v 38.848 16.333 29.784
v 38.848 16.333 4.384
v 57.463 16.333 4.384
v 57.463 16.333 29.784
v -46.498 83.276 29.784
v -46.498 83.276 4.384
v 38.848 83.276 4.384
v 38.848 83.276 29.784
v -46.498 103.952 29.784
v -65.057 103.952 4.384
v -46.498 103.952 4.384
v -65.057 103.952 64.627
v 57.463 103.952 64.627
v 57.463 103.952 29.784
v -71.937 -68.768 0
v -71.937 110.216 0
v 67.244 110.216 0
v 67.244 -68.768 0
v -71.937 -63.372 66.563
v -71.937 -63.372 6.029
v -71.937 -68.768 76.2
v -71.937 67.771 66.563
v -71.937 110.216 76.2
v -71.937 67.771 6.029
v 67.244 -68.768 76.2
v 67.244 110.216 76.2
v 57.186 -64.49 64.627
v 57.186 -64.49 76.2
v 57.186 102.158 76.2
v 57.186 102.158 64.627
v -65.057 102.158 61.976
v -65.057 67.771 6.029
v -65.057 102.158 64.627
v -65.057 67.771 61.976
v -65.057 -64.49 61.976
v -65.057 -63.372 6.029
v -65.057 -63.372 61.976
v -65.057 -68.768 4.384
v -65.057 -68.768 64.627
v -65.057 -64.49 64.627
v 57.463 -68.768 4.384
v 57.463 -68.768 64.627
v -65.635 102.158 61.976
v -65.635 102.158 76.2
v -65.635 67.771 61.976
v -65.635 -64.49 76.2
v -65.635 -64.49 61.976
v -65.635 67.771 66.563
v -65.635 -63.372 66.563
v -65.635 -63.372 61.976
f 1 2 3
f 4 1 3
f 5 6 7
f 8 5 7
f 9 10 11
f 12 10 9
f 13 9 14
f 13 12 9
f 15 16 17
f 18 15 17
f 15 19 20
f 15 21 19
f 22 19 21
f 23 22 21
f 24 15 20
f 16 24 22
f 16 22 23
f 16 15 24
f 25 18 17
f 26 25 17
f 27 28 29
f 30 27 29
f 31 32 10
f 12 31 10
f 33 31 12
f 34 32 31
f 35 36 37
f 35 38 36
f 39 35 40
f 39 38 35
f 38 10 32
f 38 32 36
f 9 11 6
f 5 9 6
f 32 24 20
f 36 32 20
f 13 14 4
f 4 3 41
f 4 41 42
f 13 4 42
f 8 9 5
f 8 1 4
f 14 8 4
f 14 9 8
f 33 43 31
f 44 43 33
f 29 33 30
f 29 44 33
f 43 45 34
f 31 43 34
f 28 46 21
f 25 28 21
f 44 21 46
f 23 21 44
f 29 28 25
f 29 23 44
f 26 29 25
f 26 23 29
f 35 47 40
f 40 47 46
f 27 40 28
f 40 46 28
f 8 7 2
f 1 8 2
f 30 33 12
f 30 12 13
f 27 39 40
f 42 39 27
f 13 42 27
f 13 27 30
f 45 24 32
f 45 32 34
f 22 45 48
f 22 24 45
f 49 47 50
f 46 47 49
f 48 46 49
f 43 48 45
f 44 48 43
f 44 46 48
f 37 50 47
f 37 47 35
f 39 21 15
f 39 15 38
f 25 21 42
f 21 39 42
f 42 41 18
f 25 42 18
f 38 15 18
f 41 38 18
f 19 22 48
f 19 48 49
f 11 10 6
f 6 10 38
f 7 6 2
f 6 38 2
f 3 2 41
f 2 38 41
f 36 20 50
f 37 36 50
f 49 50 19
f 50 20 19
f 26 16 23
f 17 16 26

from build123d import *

# Parameters (mm, degrees)
F0_W     = 139.181651175
F0_H     = 178.9838671684
F1_DEPTH = 76.2
F2_W     = 122.5202530622
F2_H     = 60.2431138977
F3_DEPTH = 172.72
F4_W     = 131.1423294246
F4_H     = 60.5337903835
F5_DEPTH = 25.4
F7_DEPTH = 25.4
F8_W     = 122.8211522102
F8_H     = 166.64852947
F9_DEPTH = 14.224


with BuildPart() as f1:
    # F0 (on Top) → F1 (new body)
    with BuildSketch(Plane.XY):
        with Locations((-2.3464225233, 20.7241773605)):
            Rectangle(F0_W, F0_H)
    extrude(amount=F1_DEPTH)

    # F2 (on face) → F3 (cut)
    with BuildSketch(Plane.XZ.offset(68.7677562237)):
        with Locations((-3.7967562675, 34.5050995238)):
            Rectangle(F2_W, F2_H)
    extrude(amount=-F3_DEPTH, mode=Mode.SUBTRACT)

    # F4 (on face) → F5 (cut)
    with BuildSketch(Plane(origin=(-71.9372481108, 0, 0), x_dir=(0, -1, 0), z_dir=(-1, 0, 0))):
        with Locations((-2.1996553987, 36.2956381869)):
            Rectangle(F4_W, F4_H)
    extrude(amount=-F5_DEPTH, mode=Mode.SUBTRACT)

    # F6 (on face) → F7 (join)
    with BuildSketch(Plane.XY.offset(4.3835425749)):
        Polygon((57.4633702636, 103.9522437763), (-46.4984178543, 103.9522437763), (-46.4984178543, 83.275783987), (38.8480201364, 83.275783987), (38.8480201364, 16.3331480634), (57.4633702636, 16.3331480634), align=None)
    extrude(amount=F7_DEPTH)

    # F8 (on face) → F9 (cut)
    with BuildSketch(Plane.XY.offset(76.2)):
        with Locations((-4.2247846723, 18.8339464366)):
            Rectangle(F8_W, F8_H)
    extrude(amount=-F9_DEPTH, mode=Mode.SUBTRACT)


solid = f1.part
